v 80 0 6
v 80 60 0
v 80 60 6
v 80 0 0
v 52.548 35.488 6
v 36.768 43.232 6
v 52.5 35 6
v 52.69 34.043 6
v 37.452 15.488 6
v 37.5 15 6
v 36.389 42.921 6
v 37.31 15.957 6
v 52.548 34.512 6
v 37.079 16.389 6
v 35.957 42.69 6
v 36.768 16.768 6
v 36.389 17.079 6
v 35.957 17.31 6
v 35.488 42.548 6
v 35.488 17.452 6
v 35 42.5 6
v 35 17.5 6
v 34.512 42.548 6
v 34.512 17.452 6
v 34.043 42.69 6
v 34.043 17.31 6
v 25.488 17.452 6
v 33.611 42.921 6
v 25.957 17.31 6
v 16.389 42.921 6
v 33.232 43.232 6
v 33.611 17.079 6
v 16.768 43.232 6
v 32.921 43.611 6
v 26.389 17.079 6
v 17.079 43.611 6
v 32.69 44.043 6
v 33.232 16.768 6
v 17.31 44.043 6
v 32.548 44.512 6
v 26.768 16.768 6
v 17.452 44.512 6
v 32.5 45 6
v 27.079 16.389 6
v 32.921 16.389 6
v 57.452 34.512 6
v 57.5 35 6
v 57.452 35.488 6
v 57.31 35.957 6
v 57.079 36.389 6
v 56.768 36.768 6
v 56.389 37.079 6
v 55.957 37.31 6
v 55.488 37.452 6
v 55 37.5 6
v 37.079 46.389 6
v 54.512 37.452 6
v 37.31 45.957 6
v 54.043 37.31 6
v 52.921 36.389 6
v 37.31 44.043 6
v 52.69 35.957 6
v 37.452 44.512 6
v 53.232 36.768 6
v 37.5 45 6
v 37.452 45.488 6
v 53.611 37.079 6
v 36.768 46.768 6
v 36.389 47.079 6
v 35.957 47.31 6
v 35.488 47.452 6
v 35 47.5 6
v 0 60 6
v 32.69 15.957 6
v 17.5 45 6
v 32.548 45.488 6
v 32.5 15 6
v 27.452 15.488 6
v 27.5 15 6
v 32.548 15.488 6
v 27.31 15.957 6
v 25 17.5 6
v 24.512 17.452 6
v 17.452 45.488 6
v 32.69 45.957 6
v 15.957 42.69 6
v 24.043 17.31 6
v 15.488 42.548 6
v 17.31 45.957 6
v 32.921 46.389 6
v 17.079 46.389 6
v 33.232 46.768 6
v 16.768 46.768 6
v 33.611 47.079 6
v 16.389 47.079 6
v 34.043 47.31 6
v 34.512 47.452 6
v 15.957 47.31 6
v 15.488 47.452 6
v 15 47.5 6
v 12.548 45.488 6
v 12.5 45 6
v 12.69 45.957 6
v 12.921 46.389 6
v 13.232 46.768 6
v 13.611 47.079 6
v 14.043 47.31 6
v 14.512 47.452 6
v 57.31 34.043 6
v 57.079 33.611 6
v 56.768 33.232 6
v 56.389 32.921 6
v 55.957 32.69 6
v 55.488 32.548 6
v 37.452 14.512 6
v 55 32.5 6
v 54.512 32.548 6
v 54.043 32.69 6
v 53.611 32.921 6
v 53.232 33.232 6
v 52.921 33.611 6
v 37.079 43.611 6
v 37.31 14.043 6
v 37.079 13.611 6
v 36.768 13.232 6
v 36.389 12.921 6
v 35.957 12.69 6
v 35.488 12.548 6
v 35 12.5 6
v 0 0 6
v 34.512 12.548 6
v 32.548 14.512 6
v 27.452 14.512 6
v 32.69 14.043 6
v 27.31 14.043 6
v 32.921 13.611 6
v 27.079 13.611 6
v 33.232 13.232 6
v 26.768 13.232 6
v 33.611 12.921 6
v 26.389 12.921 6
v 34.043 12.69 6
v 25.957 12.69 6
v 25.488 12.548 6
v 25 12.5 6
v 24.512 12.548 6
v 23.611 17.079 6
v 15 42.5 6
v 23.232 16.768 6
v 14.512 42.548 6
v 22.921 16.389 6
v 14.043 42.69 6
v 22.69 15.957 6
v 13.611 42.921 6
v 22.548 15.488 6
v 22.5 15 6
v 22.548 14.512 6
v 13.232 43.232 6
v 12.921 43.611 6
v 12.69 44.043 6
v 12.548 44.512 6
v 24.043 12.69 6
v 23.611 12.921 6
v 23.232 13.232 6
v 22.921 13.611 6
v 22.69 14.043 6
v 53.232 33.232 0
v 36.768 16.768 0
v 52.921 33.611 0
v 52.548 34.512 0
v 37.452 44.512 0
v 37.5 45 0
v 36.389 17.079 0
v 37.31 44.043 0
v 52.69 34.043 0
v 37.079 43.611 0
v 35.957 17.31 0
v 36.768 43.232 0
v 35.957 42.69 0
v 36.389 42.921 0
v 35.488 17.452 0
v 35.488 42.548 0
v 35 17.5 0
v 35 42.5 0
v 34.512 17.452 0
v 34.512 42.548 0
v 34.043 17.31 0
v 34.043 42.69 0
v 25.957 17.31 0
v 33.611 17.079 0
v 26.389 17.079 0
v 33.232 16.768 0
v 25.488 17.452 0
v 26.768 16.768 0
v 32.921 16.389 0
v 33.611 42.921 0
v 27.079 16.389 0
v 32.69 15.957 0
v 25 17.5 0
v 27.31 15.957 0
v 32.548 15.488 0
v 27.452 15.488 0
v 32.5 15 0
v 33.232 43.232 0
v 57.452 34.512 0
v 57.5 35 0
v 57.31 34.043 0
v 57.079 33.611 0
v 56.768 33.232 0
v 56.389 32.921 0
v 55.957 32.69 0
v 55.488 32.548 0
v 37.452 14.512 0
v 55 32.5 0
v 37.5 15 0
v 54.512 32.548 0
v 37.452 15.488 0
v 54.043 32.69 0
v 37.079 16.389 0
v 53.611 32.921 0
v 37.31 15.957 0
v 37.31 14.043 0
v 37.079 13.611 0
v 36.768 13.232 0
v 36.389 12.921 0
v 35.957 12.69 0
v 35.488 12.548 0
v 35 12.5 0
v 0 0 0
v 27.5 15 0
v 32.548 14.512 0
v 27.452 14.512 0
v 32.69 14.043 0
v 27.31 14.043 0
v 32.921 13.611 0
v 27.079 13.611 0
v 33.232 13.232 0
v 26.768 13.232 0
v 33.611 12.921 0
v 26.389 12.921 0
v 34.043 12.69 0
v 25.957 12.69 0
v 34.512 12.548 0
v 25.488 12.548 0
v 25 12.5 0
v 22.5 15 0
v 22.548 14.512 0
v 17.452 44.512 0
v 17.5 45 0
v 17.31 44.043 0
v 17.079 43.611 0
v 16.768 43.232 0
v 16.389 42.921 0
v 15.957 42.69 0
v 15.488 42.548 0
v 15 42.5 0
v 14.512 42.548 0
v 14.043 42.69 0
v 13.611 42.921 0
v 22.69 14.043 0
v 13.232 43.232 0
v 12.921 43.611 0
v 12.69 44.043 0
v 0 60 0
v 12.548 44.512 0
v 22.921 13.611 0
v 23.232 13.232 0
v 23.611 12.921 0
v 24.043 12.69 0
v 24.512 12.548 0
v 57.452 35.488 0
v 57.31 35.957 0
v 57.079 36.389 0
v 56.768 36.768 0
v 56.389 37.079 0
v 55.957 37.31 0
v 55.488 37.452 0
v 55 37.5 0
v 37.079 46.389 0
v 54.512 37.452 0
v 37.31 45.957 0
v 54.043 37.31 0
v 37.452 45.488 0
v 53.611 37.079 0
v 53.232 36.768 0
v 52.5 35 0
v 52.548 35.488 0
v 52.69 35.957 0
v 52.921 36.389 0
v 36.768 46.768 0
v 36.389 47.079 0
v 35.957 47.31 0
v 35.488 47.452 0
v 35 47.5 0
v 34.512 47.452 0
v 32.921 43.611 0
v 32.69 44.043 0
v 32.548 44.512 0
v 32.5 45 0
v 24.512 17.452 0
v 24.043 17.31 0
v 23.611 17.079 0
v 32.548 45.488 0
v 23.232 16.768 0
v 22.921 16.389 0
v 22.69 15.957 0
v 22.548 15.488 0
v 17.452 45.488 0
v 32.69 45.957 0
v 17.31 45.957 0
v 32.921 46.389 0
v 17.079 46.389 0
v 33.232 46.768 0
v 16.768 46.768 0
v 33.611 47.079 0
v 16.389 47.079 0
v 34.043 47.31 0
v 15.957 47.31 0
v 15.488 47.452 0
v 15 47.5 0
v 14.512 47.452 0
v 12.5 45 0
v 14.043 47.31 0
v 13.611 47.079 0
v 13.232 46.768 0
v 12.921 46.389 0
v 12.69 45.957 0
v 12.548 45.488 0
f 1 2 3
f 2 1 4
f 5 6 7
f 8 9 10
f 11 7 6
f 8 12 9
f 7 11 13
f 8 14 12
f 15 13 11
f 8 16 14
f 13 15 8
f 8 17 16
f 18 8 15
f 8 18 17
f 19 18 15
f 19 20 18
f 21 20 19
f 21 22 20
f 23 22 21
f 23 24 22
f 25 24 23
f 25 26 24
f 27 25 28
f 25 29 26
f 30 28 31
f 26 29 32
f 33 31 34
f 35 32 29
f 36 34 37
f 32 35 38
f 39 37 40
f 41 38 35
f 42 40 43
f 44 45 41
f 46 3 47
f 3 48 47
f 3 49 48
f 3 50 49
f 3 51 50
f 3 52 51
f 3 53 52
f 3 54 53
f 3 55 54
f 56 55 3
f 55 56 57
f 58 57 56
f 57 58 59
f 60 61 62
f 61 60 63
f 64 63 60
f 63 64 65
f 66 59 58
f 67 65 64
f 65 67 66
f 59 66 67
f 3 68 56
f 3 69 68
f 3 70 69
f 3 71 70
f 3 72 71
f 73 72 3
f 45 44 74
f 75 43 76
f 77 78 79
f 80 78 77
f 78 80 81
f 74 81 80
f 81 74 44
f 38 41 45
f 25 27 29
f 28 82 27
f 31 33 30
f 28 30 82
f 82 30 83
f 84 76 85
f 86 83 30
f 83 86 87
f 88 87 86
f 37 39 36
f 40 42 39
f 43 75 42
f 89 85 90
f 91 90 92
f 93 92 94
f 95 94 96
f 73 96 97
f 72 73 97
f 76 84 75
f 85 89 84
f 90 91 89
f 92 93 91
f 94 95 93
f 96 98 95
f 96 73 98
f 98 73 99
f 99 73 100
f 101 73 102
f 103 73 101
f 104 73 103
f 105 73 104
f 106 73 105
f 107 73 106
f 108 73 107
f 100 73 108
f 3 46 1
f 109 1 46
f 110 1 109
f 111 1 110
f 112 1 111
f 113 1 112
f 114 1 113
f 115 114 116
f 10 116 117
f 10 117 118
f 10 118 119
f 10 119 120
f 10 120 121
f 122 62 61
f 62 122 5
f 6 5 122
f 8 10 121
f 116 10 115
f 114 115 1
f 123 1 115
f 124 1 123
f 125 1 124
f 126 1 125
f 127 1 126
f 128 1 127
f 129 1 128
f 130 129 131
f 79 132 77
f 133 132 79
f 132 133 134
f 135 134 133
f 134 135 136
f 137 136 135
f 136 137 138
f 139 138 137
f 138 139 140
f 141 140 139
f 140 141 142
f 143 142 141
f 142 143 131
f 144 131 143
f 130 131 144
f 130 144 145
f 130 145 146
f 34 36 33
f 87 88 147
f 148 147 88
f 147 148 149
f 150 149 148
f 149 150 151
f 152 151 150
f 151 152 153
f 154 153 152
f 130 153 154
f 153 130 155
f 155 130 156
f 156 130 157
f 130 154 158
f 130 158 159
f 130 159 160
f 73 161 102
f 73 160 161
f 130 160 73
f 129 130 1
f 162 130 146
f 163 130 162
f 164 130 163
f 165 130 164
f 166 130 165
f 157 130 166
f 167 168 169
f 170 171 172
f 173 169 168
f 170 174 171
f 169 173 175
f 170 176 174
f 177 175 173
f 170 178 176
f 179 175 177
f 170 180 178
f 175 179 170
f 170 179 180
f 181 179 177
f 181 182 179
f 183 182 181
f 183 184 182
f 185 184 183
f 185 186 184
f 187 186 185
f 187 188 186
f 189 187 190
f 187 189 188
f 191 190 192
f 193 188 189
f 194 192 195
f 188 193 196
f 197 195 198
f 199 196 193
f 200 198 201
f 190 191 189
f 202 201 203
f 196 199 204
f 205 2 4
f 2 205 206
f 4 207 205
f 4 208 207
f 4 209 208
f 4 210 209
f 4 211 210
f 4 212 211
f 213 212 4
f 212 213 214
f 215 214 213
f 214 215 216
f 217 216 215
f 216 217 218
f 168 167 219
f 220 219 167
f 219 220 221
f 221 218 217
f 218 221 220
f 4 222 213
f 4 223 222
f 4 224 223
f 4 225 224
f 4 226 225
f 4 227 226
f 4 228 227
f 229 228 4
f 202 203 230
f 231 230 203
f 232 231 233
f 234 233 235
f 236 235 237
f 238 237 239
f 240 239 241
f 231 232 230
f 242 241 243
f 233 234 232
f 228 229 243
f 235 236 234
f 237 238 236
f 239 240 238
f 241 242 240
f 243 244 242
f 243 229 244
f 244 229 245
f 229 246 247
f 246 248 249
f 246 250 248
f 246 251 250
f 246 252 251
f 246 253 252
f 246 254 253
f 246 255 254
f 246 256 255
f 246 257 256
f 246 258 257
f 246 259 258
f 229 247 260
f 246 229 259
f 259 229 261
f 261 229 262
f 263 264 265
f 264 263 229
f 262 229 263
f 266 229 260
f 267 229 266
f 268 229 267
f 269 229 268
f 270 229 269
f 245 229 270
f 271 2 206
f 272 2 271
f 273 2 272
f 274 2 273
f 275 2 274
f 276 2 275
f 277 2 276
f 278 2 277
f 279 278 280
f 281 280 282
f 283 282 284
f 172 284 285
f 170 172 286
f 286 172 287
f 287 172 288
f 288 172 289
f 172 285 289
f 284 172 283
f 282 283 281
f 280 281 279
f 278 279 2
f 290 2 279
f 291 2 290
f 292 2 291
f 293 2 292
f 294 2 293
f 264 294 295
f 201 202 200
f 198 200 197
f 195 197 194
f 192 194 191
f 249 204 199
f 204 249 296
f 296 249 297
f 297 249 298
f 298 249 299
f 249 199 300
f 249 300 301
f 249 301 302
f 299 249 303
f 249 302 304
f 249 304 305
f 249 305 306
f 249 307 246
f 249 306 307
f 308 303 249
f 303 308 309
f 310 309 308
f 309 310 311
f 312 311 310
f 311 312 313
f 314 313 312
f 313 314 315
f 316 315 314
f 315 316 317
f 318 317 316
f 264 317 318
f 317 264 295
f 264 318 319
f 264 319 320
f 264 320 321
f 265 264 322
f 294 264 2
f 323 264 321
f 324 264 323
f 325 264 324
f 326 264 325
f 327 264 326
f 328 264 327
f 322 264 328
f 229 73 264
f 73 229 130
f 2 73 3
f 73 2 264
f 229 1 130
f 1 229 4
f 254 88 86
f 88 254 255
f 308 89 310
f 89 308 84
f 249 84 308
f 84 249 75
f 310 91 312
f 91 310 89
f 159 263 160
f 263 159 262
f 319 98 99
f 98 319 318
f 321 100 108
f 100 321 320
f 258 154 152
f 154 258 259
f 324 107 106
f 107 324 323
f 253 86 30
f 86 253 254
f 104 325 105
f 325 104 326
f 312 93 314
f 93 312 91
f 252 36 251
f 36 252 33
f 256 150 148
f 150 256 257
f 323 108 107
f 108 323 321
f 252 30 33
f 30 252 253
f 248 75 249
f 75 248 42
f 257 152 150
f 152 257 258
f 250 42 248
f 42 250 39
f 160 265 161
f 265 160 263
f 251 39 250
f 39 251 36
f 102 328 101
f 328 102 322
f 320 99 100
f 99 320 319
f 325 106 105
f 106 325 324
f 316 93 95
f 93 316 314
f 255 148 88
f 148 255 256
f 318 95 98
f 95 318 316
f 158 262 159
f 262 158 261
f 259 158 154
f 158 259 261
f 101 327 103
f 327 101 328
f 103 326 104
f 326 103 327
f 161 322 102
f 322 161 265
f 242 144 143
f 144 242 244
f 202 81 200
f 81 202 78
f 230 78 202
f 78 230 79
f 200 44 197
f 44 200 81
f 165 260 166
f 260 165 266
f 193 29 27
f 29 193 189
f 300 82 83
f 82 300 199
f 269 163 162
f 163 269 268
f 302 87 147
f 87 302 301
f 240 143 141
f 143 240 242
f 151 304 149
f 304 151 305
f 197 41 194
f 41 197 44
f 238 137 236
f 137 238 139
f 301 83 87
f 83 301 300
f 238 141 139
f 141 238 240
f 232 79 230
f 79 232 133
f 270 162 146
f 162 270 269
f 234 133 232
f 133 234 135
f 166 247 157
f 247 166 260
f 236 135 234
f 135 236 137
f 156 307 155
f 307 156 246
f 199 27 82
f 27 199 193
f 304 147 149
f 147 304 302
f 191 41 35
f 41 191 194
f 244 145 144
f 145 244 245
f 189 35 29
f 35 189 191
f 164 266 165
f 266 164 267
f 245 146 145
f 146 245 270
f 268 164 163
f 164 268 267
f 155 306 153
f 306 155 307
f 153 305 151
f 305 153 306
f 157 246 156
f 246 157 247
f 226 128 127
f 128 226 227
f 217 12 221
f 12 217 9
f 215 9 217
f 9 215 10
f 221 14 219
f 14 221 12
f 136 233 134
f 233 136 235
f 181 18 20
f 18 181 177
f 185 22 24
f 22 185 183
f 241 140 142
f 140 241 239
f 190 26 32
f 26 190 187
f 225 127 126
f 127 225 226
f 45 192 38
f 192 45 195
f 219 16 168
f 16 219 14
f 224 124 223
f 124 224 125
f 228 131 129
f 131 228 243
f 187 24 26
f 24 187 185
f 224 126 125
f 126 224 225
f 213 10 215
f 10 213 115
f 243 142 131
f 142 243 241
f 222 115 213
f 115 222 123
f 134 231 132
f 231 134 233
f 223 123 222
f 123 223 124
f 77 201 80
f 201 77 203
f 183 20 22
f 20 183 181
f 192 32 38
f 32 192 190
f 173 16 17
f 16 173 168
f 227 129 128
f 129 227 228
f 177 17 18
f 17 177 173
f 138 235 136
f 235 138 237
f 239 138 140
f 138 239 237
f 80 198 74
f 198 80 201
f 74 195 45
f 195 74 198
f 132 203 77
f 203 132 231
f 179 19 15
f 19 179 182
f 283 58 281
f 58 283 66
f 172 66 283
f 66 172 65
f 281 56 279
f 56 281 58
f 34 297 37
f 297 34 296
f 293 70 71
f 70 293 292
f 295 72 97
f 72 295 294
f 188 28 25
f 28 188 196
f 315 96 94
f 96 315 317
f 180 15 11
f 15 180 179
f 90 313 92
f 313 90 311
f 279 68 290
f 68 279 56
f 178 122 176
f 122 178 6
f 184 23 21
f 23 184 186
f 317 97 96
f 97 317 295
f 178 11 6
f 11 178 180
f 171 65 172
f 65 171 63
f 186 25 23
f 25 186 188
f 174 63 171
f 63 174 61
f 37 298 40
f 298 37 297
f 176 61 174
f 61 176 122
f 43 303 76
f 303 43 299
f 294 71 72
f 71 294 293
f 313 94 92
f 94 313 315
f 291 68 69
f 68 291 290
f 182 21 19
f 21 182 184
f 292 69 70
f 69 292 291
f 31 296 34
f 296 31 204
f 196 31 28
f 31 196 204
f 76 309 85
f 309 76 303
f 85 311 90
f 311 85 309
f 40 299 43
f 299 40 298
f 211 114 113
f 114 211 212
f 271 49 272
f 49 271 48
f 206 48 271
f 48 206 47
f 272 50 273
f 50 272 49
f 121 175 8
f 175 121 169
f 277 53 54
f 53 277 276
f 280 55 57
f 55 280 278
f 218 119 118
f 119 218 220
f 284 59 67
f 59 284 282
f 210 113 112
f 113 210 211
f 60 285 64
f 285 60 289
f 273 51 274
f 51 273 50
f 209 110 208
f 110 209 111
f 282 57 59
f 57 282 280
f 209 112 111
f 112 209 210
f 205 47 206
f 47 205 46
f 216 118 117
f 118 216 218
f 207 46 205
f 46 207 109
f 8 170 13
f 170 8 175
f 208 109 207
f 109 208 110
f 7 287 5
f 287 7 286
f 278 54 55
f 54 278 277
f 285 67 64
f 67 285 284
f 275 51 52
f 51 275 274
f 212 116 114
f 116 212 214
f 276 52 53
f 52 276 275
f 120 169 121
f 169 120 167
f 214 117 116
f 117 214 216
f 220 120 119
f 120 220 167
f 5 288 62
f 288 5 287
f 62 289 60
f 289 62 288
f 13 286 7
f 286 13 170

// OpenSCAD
$fn = 32;

// ----------------------------------------------------------------------
// Hole field: plate with holes at given coordinates
// ----------------------------------------------------------------------

// --- parameters (mm) ---
plate_l = 80;             // plate length, X
plate_w = 60;             // plate width, Y
plate_t = 6;              // plate thickness, Z
hole_d = 5;               // hole diameter

difference() {
  cube([plate_l, plate_w, plate_t]);
  translate([15, 45, -1]) cylinder(h = plate_t + 2, d = hole_d);
  translate([25, 15, -1]) cylinder(h = plate_t + 2, d = hole_d);
  translate([35, 15, -1]) cylinder(h = plate_t + 2, d = hole_d);
  translate([35, 45, -1]) cylinder(h = plate_t + 2, d = hole_d);
  translate([55, 35, -1]) cylinder(h = plate_t + 2, d = hole_d);
}
